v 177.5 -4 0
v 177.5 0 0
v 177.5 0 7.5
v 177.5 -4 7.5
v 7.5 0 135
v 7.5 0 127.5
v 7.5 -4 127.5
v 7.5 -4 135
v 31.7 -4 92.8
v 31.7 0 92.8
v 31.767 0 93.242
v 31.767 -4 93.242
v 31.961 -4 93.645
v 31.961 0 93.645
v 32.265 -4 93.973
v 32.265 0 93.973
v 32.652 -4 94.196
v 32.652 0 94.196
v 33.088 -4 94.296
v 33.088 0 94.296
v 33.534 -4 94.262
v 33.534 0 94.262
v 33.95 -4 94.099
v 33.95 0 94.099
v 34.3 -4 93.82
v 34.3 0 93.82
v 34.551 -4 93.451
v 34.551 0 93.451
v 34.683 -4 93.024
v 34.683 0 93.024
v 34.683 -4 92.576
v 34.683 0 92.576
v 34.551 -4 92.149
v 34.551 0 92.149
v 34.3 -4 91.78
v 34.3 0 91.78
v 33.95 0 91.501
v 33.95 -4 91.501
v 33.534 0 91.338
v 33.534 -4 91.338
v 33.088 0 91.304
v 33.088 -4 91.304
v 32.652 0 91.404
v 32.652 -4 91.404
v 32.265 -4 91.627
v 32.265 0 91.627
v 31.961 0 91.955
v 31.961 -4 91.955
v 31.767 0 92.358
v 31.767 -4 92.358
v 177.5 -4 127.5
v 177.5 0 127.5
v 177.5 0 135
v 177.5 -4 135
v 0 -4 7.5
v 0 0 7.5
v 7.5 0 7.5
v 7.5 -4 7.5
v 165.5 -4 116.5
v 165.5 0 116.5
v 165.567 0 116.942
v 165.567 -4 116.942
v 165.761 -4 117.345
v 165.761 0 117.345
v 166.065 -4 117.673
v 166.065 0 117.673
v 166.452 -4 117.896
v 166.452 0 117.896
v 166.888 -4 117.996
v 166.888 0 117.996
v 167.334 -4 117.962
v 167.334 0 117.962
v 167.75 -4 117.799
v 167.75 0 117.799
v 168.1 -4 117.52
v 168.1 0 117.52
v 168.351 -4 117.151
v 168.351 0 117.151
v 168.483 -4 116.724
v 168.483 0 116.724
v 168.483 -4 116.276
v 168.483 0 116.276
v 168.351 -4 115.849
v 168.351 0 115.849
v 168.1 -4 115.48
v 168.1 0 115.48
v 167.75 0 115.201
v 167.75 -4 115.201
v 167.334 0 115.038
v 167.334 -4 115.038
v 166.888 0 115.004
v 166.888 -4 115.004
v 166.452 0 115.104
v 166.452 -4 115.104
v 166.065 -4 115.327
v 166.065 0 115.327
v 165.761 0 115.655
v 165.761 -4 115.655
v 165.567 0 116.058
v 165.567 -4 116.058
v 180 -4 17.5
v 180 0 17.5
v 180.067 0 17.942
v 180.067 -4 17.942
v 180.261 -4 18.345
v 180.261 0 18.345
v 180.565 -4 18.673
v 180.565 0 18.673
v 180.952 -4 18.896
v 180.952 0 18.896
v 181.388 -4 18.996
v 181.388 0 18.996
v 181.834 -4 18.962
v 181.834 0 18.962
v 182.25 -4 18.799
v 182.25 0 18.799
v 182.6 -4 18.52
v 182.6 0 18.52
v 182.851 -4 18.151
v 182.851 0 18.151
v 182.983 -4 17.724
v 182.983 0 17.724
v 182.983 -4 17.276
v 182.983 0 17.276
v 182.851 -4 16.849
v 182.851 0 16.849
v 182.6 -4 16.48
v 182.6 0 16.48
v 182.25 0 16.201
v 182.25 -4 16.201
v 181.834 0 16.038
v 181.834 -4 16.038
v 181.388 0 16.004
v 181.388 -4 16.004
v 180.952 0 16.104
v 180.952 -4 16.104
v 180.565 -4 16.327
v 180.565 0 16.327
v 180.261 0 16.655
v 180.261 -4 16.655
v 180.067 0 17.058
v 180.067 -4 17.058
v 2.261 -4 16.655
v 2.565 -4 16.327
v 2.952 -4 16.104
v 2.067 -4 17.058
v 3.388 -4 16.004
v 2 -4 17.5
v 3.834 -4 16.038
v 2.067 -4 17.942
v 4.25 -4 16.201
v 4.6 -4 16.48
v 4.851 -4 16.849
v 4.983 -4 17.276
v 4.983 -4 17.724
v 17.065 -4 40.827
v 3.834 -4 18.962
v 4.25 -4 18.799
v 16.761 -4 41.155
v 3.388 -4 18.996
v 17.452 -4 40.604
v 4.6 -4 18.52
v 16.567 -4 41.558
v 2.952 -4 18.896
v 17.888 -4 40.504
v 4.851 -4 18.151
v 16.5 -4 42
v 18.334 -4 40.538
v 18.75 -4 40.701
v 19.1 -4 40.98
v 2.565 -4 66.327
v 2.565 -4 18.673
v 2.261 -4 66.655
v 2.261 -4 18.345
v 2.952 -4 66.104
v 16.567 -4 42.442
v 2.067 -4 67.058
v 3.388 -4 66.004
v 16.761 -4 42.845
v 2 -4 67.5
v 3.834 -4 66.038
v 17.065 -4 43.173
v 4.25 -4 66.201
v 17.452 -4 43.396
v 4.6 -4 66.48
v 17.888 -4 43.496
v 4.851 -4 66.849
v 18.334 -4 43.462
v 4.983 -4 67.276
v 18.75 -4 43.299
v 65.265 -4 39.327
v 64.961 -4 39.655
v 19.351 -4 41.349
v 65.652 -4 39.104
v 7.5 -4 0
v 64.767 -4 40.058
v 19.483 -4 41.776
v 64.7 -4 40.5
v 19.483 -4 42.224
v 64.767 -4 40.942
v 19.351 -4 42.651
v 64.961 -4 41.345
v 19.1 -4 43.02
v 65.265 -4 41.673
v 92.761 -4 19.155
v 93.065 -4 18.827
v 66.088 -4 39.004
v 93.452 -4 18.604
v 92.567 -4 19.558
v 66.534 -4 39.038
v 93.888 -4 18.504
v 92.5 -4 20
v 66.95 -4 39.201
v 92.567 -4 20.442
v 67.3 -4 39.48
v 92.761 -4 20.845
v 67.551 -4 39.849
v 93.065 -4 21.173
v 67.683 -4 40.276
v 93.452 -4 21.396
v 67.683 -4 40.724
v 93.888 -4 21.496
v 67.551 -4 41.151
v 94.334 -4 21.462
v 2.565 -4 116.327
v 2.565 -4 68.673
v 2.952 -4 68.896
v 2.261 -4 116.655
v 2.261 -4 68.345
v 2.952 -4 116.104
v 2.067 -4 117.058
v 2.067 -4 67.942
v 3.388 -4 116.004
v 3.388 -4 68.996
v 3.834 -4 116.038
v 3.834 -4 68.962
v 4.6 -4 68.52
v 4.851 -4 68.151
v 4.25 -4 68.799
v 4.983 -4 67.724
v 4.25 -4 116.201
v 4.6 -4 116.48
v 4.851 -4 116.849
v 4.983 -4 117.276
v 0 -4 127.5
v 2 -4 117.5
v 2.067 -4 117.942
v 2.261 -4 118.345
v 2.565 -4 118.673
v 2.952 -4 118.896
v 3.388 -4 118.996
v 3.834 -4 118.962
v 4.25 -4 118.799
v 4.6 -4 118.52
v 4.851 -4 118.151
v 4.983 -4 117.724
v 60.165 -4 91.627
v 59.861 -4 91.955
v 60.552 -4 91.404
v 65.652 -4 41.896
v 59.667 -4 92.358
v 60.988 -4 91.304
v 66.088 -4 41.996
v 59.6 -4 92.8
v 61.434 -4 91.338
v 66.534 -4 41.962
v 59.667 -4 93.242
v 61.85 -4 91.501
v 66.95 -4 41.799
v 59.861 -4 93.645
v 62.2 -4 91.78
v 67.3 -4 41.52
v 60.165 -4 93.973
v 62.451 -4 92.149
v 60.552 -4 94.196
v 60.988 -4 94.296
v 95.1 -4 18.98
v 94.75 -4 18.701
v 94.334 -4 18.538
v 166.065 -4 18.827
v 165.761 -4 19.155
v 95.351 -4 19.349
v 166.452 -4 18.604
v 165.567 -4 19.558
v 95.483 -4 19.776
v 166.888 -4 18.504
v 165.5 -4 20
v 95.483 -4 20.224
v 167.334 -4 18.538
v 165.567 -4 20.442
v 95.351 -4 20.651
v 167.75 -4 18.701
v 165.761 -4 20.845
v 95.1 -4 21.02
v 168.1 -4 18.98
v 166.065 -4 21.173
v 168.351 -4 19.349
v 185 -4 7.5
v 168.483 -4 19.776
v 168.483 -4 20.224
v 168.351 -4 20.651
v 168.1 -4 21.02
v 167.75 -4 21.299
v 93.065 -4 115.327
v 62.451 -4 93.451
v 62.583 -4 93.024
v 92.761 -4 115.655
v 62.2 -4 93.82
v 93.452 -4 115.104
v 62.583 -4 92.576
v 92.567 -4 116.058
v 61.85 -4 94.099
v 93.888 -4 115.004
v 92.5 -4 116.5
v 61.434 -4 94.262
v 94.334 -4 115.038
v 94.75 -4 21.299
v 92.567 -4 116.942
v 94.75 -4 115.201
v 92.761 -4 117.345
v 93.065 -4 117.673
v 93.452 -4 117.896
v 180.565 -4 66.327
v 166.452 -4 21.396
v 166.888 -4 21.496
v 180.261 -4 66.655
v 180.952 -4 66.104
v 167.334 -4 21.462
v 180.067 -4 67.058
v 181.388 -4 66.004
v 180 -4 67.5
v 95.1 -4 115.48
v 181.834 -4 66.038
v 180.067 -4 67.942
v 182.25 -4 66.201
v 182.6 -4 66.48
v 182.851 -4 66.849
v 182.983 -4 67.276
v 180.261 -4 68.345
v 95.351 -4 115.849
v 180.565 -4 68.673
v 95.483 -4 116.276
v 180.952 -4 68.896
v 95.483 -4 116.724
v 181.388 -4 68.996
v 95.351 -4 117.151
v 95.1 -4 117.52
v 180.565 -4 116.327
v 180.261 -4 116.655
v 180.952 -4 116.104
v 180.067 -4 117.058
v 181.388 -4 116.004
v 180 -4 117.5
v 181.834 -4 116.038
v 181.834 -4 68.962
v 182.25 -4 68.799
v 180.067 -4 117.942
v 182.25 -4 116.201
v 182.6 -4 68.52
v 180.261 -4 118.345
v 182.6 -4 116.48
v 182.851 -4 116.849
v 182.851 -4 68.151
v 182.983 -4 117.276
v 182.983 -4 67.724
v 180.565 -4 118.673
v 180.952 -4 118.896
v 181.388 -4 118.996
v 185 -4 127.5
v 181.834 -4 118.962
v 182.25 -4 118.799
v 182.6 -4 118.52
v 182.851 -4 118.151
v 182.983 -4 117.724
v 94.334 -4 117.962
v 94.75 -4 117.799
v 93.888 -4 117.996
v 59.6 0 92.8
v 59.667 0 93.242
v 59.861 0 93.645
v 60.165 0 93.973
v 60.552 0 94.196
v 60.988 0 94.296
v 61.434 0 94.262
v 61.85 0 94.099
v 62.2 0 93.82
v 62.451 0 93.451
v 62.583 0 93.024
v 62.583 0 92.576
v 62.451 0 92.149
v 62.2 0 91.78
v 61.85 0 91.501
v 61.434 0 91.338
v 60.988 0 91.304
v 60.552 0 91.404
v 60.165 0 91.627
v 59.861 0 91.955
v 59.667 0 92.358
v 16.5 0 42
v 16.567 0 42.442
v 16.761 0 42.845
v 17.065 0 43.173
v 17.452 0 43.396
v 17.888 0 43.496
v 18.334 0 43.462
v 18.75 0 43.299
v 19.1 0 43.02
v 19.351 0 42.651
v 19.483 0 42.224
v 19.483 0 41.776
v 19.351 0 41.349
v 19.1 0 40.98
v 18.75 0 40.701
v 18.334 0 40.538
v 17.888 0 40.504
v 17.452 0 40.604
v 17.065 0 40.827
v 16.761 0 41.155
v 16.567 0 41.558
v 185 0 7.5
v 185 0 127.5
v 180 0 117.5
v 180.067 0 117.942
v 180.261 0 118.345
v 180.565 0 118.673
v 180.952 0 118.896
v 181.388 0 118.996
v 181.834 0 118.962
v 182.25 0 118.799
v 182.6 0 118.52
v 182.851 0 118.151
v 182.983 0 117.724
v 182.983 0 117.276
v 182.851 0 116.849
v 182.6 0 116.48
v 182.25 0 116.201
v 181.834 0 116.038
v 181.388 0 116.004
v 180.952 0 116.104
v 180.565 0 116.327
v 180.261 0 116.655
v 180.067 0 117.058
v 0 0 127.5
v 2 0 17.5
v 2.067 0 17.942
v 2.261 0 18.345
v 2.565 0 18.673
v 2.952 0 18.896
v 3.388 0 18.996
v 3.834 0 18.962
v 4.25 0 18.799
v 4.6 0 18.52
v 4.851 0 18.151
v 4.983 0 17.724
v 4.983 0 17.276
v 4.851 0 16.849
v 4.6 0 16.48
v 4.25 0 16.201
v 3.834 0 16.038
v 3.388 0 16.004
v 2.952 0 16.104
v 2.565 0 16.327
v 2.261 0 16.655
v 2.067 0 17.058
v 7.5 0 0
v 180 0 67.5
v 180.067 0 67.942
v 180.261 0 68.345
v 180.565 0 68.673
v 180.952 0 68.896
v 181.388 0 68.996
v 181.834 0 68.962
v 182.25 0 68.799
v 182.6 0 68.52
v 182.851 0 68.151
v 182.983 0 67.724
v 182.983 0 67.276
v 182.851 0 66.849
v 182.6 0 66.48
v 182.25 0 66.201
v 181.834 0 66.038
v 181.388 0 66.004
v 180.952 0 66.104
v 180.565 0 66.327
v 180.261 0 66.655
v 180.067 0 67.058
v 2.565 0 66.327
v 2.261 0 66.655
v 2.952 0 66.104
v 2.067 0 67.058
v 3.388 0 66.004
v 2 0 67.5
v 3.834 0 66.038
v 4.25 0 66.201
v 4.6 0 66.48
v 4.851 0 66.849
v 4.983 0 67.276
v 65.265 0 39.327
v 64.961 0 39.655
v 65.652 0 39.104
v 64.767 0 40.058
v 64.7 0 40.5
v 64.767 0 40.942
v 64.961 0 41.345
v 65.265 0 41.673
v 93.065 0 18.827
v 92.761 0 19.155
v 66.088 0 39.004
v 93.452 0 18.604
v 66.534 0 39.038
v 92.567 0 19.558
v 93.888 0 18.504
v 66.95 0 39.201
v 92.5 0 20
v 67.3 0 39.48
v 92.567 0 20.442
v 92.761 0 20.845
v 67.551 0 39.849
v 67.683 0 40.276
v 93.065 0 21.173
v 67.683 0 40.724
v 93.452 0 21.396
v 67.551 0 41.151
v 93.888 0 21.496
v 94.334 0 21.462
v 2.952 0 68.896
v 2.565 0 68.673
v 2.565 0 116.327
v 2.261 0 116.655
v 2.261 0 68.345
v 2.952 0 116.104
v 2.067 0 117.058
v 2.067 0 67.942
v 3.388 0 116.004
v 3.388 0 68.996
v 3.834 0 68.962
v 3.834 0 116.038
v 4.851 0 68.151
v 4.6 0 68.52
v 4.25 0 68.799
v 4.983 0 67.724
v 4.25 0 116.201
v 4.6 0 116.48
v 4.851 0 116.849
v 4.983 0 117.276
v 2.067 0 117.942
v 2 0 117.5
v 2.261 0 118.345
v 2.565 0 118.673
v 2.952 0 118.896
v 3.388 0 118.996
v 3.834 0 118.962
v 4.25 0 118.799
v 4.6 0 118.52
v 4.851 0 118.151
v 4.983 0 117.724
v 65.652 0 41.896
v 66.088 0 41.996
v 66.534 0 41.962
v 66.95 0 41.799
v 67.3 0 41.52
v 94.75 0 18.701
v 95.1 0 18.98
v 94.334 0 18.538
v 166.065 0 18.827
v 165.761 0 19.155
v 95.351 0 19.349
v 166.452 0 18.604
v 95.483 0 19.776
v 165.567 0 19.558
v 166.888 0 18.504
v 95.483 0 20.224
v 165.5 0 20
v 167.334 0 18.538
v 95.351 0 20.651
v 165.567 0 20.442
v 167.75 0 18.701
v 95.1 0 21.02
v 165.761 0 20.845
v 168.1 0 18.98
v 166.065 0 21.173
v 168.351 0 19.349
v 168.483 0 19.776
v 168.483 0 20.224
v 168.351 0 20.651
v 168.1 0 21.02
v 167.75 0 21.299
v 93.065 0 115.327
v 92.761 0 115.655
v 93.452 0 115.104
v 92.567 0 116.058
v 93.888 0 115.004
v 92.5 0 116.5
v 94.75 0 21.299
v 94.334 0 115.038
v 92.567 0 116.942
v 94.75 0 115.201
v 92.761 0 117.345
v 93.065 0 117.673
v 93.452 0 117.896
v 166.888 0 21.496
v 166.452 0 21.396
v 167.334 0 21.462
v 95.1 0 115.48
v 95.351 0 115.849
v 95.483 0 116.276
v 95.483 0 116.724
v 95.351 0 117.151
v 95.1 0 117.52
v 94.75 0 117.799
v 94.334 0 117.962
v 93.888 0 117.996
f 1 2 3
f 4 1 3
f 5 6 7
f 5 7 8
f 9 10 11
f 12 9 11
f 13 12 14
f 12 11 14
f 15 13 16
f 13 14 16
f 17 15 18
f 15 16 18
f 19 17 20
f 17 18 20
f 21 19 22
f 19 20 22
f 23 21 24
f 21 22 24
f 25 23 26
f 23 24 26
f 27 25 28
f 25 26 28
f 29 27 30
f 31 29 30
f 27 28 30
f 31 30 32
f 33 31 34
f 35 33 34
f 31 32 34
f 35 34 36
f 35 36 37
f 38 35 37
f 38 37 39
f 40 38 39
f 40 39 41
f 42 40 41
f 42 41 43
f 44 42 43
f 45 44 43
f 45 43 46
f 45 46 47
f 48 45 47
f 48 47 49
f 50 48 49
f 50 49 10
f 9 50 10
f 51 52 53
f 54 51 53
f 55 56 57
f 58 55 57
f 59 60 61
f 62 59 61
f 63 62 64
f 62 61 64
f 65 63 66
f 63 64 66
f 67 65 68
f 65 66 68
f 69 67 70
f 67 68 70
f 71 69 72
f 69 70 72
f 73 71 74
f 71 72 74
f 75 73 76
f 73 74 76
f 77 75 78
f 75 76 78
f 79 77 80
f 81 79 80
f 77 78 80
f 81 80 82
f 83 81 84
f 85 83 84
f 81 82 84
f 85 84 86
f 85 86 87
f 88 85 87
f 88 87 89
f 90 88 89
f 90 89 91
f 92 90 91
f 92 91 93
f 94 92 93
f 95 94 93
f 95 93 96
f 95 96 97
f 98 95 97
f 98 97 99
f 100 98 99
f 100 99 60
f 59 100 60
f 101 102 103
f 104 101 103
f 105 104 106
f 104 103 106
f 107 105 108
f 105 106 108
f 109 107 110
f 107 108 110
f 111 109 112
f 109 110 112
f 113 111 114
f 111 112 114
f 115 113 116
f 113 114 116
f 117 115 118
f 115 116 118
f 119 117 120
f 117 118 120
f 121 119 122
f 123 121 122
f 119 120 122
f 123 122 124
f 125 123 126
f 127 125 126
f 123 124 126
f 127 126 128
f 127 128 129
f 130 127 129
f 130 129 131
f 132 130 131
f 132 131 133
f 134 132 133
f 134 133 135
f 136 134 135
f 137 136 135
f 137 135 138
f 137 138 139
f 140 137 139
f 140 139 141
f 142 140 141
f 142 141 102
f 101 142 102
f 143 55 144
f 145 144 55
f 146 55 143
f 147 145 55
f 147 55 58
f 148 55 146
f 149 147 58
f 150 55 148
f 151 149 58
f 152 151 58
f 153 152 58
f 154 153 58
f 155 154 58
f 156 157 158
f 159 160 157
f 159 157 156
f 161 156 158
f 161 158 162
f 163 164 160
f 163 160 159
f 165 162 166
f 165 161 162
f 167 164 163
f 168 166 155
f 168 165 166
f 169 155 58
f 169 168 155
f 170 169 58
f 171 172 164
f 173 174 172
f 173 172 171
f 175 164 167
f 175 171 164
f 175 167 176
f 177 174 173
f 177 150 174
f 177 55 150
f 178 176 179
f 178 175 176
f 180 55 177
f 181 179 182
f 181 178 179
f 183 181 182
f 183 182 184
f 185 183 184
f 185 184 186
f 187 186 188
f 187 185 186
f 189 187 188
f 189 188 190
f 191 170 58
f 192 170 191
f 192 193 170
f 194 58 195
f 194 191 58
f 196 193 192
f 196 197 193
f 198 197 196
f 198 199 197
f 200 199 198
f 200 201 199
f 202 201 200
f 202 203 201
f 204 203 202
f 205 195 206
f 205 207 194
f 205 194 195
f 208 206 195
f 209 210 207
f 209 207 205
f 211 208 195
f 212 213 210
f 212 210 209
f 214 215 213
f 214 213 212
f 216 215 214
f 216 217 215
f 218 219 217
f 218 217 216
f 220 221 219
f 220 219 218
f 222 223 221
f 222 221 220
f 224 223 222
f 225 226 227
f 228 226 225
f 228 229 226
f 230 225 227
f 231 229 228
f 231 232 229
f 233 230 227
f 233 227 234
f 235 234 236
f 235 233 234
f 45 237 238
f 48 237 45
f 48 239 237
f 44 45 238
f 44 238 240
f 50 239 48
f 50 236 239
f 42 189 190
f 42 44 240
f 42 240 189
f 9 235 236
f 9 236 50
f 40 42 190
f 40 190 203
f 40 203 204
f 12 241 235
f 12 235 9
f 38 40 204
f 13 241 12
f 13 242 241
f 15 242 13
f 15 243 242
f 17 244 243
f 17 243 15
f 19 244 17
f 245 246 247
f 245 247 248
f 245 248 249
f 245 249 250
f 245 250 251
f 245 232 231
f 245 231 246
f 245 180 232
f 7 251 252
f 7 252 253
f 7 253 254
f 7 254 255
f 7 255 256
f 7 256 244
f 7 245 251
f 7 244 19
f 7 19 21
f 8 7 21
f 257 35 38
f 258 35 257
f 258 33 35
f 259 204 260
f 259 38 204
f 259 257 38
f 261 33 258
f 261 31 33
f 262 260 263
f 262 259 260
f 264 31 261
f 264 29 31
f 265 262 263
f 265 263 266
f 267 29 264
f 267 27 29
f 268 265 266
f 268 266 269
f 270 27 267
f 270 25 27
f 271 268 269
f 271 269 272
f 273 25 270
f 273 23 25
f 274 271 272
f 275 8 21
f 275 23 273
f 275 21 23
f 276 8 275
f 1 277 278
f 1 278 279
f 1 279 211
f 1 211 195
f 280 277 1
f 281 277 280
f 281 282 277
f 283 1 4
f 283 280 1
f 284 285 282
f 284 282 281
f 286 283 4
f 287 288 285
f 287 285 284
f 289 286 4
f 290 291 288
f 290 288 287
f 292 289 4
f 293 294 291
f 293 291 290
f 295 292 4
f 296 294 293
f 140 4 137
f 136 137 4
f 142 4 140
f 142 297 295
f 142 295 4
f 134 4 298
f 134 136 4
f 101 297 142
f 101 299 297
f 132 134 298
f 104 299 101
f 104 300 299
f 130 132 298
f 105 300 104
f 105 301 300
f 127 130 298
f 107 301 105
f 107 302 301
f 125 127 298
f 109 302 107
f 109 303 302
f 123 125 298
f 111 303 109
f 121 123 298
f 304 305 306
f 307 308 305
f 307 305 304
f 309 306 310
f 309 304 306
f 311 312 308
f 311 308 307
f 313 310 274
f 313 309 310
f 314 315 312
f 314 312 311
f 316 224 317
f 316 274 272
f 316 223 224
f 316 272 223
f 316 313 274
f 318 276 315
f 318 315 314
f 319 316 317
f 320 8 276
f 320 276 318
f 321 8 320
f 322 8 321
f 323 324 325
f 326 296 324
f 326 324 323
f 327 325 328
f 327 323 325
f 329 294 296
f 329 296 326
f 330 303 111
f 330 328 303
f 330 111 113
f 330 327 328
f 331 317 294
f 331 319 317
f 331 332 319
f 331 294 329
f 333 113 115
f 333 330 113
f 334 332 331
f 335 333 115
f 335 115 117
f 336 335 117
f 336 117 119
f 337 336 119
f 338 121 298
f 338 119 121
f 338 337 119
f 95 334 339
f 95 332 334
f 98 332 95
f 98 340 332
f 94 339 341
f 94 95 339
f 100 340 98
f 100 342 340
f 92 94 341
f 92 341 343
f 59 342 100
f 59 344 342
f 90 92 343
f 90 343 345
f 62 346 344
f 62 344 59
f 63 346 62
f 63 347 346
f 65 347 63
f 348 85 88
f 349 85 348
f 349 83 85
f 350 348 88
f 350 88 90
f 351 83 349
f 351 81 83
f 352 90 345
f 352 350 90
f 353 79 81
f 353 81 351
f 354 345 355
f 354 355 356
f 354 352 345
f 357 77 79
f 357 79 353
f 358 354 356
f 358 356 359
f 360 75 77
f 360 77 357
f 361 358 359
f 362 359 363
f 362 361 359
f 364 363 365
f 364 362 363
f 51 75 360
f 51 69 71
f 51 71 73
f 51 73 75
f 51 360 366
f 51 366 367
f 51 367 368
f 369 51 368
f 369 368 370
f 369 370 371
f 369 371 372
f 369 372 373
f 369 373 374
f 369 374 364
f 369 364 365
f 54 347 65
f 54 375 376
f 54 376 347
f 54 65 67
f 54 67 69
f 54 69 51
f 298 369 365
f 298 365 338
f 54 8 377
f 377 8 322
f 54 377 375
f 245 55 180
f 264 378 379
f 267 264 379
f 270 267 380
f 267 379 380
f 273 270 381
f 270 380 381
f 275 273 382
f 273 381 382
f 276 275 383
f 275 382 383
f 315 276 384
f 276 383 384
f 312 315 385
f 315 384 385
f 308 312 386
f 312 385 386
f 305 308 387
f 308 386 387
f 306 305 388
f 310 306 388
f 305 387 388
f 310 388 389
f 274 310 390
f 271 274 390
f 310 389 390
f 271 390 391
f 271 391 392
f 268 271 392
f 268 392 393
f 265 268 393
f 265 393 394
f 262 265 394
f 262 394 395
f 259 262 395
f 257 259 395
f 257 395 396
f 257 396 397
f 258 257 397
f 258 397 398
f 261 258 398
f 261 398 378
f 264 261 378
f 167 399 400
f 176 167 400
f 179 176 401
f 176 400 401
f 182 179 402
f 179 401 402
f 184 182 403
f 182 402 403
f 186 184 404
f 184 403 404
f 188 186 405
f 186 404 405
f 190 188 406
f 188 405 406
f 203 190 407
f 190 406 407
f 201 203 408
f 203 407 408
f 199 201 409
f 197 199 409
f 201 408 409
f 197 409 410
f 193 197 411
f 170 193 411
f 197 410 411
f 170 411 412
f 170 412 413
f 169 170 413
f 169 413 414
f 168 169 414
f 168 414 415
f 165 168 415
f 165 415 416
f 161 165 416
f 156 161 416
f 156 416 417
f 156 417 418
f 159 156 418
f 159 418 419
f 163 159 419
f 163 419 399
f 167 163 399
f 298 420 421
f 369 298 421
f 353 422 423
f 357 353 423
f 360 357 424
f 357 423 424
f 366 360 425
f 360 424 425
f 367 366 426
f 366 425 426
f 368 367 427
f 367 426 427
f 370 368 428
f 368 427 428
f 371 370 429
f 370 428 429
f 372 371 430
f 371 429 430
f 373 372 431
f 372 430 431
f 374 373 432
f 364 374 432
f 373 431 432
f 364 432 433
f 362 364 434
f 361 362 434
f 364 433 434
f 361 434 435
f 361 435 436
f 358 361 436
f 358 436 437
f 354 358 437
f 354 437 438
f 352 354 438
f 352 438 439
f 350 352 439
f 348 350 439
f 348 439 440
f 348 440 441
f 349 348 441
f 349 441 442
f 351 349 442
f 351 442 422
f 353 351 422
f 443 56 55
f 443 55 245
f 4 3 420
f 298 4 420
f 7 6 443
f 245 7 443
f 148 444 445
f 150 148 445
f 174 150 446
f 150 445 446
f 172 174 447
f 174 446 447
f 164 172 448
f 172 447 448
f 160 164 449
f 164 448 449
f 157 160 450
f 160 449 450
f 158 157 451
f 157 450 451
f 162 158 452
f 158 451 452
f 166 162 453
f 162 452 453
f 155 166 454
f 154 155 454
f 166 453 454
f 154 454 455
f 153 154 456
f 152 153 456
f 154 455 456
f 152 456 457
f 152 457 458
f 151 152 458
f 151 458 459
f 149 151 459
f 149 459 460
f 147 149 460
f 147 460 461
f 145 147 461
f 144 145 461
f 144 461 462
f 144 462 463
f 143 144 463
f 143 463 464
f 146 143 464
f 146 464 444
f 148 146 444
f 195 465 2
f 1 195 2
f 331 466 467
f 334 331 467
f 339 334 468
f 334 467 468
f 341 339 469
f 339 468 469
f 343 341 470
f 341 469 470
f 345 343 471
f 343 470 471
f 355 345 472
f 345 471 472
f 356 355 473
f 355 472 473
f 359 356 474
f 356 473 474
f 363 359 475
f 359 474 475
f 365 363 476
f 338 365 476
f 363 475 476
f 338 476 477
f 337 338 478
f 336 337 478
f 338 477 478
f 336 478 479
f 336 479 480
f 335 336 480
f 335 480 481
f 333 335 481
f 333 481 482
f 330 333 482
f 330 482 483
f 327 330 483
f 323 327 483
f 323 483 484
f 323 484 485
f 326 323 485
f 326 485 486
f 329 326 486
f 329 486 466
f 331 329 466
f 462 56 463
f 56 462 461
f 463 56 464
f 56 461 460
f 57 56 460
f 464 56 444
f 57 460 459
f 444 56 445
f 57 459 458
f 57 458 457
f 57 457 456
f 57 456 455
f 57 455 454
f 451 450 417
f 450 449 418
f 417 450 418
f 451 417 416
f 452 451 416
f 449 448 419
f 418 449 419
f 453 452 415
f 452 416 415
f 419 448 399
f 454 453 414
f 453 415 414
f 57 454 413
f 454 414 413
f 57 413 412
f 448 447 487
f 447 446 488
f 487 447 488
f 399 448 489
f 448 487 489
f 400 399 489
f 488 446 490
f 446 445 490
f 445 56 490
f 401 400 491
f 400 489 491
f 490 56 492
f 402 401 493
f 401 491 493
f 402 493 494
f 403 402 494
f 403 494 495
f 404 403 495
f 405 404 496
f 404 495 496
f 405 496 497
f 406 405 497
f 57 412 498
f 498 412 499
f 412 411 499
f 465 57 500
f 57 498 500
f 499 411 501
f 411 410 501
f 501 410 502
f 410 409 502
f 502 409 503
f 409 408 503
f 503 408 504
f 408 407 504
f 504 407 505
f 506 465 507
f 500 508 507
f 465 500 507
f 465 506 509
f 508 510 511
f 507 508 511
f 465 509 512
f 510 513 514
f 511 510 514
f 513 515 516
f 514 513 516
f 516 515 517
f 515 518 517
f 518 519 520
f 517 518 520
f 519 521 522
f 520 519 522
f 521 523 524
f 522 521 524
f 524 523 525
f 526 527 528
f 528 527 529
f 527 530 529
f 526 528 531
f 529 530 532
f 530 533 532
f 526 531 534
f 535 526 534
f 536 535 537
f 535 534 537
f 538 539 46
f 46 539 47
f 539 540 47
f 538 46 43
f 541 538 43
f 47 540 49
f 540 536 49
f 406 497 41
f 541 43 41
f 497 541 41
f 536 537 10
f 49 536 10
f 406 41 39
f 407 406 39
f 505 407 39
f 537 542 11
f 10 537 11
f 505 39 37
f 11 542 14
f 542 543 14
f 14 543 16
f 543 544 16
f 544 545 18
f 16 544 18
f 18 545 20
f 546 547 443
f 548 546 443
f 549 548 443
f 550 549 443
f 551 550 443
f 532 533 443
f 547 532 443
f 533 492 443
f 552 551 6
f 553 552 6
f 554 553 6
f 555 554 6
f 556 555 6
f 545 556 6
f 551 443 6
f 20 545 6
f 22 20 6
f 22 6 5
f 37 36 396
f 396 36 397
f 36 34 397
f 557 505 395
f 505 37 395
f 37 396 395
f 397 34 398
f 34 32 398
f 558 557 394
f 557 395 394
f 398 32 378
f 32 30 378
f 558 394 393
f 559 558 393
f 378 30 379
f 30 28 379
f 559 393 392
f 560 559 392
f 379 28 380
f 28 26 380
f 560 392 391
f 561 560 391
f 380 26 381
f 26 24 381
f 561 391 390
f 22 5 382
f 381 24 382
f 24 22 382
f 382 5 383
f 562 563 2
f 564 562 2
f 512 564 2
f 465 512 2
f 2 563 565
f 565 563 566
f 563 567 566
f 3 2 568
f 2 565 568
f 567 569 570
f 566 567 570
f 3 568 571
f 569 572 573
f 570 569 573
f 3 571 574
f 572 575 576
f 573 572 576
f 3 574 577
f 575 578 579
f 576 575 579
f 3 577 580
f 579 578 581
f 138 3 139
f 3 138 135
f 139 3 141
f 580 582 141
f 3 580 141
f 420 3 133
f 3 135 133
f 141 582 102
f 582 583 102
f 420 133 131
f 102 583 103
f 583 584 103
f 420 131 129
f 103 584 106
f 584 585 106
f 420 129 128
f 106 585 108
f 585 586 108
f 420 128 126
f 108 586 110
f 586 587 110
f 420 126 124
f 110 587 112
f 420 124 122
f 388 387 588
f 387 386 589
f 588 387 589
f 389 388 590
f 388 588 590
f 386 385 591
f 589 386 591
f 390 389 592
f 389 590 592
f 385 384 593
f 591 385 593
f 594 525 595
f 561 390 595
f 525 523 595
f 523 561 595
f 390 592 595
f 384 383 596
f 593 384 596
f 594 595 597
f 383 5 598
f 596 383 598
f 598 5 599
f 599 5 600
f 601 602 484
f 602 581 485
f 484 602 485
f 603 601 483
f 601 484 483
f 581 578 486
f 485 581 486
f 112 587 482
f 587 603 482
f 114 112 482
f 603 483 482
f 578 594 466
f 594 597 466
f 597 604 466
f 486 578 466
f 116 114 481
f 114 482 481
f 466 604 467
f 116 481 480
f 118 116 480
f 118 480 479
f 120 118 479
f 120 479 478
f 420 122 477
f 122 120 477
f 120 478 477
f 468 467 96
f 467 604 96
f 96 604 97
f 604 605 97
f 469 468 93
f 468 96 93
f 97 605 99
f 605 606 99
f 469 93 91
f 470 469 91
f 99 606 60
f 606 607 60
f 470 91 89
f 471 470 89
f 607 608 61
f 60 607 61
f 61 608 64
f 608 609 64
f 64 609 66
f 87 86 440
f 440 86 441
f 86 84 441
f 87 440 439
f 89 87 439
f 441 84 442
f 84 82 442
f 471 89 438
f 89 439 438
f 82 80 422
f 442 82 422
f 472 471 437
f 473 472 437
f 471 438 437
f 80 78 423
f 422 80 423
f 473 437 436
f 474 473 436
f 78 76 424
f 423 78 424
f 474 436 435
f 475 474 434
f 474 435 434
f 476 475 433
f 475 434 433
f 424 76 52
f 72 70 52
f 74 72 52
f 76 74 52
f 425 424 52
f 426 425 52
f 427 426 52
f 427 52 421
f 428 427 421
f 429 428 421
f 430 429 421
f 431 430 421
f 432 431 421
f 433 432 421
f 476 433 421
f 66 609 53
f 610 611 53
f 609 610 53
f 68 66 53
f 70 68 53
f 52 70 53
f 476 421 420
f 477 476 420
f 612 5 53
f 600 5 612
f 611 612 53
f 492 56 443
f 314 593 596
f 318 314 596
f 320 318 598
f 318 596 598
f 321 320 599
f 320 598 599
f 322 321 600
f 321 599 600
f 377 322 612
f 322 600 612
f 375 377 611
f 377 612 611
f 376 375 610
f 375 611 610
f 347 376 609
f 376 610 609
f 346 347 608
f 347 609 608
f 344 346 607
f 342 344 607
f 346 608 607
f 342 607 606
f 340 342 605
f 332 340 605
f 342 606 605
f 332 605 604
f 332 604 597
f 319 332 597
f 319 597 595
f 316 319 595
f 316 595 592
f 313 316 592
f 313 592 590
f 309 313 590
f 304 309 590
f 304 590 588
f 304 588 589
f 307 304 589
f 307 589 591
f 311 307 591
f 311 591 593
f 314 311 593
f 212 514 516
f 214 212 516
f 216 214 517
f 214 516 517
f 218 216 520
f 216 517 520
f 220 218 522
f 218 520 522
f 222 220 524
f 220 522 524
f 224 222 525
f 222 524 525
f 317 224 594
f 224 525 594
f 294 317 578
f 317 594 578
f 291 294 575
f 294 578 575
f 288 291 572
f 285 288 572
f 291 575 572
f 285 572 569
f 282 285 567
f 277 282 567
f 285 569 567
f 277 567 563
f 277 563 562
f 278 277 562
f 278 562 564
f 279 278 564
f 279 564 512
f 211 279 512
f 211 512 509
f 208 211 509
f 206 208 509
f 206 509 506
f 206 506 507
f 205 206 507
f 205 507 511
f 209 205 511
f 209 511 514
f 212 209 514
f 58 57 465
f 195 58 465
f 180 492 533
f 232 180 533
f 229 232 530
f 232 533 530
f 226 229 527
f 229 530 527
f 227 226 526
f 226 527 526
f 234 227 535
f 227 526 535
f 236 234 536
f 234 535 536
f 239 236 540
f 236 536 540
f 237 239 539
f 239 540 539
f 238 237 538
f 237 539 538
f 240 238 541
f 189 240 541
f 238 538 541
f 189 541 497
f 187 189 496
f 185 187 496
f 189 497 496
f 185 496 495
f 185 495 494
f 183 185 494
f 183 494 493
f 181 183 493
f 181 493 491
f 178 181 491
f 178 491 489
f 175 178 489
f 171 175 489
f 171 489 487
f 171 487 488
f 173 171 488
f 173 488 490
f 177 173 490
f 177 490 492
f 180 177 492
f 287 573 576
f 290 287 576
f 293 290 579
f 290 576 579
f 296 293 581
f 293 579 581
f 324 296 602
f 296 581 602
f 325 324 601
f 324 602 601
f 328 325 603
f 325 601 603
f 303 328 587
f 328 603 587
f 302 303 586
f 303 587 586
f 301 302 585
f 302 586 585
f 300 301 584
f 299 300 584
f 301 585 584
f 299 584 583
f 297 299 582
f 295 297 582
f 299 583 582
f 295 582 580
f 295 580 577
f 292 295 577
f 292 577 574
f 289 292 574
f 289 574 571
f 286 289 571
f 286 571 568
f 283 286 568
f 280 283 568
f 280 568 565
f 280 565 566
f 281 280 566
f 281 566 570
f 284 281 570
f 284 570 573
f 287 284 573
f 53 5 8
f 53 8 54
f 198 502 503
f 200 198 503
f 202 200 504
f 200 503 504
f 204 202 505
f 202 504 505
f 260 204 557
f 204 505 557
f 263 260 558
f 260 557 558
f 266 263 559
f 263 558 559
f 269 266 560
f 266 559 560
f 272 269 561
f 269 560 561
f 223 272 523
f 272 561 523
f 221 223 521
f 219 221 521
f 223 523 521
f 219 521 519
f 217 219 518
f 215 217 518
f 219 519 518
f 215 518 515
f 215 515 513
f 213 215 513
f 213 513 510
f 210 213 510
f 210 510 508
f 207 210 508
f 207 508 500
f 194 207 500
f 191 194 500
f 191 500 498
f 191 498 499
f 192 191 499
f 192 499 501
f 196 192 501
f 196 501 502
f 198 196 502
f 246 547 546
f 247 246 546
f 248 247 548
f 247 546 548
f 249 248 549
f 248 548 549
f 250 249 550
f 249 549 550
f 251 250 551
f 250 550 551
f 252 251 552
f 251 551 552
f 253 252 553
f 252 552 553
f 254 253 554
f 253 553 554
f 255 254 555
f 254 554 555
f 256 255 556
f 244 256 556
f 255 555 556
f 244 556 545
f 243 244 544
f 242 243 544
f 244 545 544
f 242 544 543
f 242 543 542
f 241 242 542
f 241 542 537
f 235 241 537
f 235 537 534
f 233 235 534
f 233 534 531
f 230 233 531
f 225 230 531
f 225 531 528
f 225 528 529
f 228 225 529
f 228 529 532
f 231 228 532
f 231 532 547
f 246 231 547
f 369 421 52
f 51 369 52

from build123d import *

# Parameters (mm, degrees)
F0_W     = 170
F0_H     = 7.5
F0_H_2   = 120
F0_W_2   = 7.5
F1_DEPTH = 4
F3_D     = 3
F5_D     = 3
F7_D     = 3


with BuildPart() as f1:
    # F0 (on Front) → F1 (new body)
    with BuildSketch(Plane.XZ):
        with Locations((92.5, 3.75)):
            Rectangle(F0_W, F0_H)
        with Locations((92.5, 67.5)):
            Rectangle(F0_W, F0_H_2)
        with Locations((3.75, 67.5)):
            Rectangle(F0_W_2, F0_H_2)
        with Locations((181.25, 67.5)):
            Rectangle(F0_W_2, F0_H_2)
        with Locations((92.5, 131.25)):
            Rectangle(F0_W, F0_H)
    extrude(amount=F1_DEPTH)

    # F3 (through all)
    with Locations(Plane.XZ.offset(4)):
        with Locations((3.5, 117.5), (3.5, 67.5), (3.5, 17.5), (181.5, 17.5), (181.5, 67.5), (181.5, 117.5)):
            Hole(F3_D / 2)

    # F5 (through all)
    with Locations(Plane.XZ.offset(4)):
        with Locations((94, 116.5), (167, 116.5), (167, 20), (94, 20)):
            Hole(F5_D / 2)

    # F7 (through all)
    with Locations(Plane.XZ.offset(4)):
        with Locations((18, 42), (33.2, 92.8), (61.1, 92.8), (66.2, 40.5)):
            Hole(F7_D / 2)


solid = f1.part
